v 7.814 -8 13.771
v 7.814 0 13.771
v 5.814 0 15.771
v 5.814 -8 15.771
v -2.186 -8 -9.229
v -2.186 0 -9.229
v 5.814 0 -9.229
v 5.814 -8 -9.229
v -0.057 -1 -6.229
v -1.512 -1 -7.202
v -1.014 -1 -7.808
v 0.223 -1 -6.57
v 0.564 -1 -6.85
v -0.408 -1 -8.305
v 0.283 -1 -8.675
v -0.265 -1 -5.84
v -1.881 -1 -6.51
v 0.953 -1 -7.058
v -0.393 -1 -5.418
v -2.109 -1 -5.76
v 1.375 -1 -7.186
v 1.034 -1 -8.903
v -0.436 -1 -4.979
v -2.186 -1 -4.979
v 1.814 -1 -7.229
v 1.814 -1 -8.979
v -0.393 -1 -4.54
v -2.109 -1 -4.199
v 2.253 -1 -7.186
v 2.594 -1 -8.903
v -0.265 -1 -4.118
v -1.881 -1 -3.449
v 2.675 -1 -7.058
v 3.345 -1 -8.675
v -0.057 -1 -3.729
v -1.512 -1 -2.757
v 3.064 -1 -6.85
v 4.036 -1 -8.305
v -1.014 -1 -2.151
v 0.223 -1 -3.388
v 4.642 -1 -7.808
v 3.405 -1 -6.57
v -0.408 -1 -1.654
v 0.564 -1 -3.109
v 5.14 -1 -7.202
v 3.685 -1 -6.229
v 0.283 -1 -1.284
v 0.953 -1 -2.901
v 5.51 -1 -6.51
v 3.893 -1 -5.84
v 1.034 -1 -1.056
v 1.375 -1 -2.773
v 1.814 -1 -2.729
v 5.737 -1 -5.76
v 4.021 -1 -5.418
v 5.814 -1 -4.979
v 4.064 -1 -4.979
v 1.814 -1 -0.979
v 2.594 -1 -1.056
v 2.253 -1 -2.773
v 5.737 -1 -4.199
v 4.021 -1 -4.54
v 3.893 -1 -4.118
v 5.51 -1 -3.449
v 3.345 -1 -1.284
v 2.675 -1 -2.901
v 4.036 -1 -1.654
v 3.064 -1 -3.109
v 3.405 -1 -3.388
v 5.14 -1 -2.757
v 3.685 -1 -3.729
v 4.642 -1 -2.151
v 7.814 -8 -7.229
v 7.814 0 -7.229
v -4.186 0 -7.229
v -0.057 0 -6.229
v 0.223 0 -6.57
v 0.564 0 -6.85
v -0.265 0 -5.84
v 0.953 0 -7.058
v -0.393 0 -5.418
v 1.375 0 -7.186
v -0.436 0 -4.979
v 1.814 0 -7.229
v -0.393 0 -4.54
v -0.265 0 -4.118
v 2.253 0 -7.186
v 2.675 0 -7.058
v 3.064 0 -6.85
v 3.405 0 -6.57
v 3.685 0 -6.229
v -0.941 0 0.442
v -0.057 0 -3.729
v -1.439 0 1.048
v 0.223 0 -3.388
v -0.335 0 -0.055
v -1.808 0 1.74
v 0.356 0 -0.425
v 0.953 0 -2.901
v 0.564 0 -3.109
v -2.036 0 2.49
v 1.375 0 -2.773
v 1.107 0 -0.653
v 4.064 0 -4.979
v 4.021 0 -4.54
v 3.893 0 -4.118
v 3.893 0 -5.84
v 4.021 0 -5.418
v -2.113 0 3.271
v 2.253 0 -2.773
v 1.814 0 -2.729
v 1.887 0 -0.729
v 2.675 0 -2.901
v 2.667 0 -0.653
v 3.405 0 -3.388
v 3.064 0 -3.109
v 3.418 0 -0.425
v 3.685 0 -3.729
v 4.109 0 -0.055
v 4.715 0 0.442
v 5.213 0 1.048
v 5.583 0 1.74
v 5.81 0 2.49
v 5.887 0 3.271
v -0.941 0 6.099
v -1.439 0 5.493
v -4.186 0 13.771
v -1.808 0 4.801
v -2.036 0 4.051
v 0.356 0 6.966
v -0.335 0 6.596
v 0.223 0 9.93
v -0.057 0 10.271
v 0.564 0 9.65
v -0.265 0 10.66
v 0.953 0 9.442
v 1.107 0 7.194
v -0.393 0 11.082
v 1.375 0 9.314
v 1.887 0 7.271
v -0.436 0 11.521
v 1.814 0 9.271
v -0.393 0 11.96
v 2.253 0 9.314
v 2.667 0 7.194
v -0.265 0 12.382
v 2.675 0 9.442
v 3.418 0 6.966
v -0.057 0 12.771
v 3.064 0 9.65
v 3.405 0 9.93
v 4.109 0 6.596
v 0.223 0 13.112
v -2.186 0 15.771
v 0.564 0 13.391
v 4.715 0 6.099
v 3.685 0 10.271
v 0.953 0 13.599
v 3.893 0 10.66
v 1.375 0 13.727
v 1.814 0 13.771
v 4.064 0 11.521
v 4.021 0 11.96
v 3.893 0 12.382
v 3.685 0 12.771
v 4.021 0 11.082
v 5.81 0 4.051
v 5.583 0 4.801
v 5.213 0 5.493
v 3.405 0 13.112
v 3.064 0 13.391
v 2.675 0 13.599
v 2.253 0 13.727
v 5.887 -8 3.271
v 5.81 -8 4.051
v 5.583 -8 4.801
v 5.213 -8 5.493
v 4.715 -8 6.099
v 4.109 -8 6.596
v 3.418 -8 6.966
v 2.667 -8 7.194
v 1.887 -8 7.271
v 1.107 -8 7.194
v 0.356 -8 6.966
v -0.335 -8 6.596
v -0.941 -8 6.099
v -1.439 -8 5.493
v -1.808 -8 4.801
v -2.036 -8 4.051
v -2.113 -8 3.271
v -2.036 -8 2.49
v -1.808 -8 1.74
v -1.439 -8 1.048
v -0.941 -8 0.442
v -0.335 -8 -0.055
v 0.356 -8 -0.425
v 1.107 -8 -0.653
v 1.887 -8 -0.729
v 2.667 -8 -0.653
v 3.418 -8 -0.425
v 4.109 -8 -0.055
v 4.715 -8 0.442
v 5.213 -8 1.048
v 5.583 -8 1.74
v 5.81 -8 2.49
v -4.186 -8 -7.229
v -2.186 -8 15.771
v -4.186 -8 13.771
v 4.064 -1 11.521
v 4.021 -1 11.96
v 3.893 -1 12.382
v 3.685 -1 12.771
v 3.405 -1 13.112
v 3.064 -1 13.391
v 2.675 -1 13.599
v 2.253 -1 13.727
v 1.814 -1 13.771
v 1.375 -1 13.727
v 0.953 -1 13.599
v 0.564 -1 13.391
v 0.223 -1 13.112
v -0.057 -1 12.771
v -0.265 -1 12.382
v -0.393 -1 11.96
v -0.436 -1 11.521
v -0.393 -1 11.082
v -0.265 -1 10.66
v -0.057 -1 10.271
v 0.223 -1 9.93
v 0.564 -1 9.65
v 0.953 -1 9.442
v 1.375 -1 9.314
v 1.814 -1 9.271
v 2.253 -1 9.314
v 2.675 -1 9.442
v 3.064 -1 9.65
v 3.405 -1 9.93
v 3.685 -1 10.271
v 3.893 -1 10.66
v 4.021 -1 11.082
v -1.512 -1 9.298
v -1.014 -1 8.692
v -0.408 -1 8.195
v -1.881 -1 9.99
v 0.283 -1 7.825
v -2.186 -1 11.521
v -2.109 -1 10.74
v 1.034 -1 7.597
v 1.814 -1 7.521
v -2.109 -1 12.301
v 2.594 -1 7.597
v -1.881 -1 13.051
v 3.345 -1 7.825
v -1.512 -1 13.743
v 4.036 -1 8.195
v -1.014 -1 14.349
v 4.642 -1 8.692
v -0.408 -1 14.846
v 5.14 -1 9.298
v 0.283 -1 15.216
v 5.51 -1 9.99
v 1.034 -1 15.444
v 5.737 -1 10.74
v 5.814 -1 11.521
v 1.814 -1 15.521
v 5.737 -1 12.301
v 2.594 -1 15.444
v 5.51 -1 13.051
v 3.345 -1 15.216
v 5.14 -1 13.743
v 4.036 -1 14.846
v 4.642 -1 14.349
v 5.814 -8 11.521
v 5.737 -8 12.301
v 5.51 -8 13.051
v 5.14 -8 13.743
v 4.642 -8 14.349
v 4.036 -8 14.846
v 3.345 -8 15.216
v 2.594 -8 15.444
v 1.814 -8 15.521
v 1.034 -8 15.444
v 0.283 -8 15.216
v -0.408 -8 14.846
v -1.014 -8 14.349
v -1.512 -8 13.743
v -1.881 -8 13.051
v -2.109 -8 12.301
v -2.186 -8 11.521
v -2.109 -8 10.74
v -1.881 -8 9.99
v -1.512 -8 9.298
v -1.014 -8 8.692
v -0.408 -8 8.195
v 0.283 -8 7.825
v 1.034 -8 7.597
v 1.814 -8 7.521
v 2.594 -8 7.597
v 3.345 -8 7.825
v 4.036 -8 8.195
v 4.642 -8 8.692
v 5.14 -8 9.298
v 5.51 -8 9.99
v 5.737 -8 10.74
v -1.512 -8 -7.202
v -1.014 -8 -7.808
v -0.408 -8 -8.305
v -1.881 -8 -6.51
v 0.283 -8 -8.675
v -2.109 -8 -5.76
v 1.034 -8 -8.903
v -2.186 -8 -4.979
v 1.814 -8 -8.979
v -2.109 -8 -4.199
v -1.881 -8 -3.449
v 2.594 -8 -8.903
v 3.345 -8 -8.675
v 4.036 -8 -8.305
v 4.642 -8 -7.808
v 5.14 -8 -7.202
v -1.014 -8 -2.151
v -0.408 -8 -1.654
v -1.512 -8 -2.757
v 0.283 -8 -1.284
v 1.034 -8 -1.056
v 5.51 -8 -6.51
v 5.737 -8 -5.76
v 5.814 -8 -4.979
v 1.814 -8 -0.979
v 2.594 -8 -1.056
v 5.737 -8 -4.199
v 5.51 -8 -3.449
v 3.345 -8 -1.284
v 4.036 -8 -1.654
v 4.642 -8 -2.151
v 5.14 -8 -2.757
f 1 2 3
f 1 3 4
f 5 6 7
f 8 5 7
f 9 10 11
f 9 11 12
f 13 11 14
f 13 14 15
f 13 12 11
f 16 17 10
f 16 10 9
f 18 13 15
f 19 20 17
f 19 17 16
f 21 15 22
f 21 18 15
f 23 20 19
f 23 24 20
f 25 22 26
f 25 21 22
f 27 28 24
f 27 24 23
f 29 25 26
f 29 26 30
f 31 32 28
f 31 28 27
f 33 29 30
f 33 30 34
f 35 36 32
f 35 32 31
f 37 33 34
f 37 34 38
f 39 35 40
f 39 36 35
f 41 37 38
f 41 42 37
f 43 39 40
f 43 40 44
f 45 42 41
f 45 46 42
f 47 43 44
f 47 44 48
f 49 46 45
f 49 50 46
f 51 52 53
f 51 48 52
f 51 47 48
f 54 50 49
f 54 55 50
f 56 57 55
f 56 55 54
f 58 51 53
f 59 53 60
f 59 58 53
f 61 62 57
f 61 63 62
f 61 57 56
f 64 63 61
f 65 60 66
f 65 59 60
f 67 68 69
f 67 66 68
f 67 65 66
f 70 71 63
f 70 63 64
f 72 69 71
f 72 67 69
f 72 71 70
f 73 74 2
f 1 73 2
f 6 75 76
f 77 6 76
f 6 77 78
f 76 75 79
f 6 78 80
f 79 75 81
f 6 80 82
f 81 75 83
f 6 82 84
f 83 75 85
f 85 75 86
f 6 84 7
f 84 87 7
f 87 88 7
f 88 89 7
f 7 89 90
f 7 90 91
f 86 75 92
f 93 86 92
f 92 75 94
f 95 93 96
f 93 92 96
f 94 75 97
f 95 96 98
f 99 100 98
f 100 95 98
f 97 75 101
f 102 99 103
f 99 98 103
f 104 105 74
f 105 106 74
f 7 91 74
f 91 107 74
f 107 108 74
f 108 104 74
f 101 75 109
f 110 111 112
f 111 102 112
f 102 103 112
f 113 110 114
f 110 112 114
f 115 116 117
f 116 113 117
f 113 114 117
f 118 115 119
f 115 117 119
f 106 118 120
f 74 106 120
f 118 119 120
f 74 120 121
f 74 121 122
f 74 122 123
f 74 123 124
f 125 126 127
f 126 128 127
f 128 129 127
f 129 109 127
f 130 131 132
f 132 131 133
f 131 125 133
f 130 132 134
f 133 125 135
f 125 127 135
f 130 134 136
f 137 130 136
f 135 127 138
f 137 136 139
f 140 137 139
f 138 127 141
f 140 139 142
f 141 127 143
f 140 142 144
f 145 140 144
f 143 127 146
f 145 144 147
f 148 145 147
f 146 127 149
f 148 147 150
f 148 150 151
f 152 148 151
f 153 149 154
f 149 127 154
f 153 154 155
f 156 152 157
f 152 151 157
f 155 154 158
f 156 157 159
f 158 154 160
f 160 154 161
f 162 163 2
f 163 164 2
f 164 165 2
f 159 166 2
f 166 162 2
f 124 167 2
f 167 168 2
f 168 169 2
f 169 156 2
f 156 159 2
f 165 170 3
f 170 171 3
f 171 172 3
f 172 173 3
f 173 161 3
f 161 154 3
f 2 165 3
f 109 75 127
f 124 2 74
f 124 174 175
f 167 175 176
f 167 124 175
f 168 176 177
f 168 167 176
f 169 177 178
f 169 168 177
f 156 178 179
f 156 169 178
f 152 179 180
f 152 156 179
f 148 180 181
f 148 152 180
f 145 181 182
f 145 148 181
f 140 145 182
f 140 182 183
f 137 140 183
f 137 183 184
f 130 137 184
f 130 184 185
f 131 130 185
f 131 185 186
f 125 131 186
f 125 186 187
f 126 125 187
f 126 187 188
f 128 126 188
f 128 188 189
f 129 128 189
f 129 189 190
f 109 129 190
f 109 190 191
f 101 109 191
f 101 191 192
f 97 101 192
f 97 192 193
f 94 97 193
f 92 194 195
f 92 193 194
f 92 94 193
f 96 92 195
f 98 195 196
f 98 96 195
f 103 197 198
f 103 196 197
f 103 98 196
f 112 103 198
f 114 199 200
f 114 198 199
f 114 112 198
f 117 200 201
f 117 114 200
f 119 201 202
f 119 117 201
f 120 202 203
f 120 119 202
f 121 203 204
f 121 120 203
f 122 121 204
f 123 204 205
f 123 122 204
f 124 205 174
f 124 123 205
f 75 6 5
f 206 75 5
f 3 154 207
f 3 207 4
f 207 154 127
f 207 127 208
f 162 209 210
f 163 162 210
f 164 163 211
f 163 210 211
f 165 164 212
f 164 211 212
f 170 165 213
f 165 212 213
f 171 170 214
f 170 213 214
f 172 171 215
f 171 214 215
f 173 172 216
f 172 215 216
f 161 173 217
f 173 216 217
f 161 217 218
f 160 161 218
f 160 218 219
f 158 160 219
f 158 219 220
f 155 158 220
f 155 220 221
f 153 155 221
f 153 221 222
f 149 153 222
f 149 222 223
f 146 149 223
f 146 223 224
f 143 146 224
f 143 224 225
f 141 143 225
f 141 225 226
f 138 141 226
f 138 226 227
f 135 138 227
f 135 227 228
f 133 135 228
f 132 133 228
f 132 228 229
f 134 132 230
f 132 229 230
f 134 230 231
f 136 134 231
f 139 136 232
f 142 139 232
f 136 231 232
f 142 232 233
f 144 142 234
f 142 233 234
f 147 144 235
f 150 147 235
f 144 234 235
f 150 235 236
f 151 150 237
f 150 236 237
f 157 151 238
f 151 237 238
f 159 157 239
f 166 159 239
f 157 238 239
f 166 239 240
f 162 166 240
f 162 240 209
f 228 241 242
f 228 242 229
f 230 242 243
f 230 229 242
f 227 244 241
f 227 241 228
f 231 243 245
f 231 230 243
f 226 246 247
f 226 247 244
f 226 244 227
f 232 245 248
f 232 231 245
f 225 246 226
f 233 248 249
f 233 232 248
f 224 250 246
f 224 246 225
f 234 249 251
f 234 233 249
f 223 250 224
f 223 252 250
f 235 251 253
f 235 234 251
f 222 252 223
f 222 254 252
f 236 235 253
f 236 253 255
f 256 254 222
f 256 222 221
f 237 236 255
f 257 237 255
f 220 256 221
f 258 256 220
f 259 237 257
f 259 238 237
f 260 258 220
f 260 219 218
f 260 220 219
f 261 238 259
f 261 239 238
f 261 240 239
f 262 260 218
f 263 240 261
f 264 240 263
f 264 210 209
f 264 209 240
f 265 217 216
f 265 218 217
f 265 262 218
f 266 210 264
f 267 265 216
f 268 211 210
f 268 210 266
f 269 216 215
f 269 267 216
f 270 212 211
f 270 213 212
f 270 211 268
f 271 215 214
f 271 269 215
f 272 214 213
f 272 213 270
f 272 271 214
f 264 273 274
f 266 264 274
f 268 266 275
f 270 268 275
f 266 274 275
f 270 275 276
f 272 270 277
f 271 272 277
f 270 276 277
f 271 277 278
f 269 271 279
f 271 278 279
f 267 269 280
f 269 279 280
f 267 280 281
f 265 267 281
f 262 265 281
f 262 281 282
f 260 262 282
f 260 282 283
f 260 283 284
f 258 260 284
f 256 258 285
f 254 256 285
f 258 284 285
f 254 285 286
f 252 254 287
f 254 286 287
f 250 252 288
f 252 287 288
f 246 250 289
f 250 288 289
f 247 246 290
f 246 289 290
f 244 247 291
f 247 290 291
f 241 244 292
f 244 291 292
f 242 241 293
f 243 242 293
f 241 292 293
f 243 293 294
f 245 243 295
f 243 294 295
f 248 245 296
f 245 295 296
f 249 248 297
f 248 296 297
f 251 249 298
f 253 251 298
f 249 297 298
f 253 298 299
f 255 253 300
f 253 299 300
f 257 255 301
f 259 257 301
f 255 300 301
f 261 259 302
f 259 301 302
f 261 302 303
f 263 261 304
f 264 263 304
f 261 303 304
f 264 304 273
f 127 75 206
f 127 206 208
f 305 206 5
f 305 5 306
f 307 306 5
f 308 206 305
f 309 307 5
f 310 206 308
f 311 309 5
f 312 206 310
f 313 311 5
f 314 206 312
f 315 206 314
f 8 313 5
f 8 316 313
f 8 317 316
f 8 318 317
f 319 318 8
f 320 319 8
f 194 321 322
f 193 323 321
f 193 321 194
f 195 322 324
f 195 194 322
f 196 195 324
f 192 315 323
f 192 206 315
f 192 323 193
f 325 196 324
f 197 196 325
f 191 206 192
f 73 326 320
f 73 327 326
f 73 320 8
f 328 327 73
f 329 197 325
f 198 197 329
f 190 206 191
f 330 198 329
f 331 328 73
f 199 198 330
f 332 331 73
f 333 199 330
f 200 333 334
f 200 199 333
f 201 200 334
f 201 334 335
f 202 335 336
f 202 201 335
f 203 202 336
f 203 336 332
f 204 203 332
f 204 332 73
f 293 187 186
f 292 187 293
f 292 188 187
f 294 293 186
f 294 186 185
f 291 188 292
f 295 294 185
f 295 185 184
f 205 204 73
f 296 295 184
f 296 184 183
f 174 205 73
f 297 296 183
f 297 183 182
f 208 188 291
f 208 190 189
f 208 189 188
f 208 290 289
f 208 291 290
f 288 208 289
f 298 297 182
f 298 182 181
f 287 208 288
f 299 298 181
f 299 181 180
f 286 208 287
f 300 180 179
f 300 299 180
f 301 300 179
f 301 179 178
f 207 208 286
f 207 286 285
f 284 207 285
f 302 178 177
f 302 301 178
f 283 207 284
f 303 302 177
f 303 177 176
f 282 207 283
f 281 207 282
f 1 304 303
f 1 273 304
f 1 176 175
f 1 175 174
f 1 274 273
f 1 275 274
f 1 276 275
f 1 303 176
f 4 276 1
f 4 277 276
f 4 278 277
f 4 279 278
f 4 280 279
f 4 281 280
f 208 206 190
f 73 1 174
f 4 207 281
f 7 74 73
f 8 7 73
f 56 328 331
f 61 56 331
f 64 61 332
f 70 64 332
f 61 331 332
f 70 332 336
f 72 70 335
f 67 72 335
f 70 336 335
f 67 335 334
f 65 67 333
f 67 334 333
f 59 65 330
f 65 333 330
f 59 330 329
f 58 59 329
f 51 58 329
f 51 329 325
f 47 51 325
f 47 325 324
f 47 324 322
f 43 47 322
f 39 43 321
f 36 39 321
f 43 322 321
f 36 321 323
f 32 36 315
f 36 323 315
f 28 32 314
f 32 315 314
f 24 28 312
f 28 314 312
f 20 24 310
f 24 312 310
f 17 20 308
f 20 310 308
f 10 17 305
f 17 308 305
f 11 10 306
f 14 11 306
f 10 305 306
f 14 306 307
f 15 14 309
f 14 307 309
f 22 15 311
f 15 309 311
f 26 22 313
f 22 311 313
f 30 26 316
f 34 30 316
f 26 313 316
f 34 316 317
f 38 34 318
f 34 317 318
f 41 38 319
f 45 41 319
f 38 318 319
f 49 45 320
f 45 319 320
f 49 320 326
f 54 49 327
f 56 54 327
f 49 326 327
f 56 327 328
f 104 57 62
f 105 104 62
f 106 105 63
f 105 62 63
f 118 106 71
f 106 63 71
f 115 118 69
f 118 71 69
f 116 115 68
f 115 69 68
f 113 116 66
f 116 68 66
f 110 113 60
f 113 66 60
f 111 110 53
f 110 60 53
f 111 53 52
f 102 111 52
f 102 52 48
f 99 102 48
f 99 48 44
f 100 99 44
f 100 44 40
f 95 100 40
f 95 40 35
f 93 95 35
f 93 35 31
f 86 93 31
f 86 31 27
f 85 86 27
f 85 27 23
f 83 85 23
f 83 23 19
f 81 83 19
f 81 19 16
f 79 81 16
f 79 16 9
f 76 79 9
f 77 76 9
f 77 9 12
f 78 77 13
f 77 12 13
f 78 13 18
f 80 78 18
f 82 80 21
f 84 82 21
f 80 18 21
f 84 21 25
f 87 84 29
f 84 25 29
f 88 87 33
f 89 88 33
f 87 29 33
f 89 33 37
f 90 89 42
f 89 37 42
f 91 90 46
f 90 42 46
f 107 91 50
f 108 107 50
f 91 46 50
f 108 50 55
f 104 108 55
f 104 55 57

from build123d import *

# Parameters (mm, degrees)
F0_W     = 12
F0_H     = 25
F1_DEPTH = 8
F2_SIZE  = 2
F3_SIZE  = 2
F4_R     = 2.25
F5_DEPTH = 25
F6_R     = 4
F7_DEPTH = 7
F8_R     = 4
F9_DEPTH = 25


with BuildPart() as f1:
    # F0 (on Front) → F1 (new body)
    with BuildSketch(Plane.XZ):
        with Locations((1.81407, 3.270565)):
            Rectangle(F0_W, F0_H)
    extrude(amount=F1_DEPTH)

    # F2
    f2_edges = [f1.edges().sort_by_distance(p)[0] for p in [
        (-4.18593, -4, 15.770565),
    ]]
    chamfer(f2_edges, length=F2_SIZE)

    # F3
    f3_edges = [f1.edges().sort_by_distance(p)[0] for p in [
        (7.81407, -4, 15.770565),
        (7.81407, -4, -9.229435),
        (-4.18593, -4, -9.229435),
    ]]
    chamfer(f3_edges, length=F3_SIZE)

    # F4 (on face) → F5 (cut)
    with BuildSketch(Plane.XZ.offset(8)):
        with Locations((1.81407, -4.979435)):
            Circle(F4_R)
        with Locations((1.81407, 11.520565)):
            Circle(F4_R)
    extrude(amount=-F5_DEPTH, mode=Mode.SUBTRACT)

    # F6 (on face) → F7 (cut)
    with BuildSketch(Plane.XZ.offset(8)):
        with Locations((1.81407, 11.520565)):
            Circle(F6_R)
        with Locations((1.81407, -4.979435)):
            Circle(F6_R)
    extrude(amount=-F7_DEPTH, mode=Mode.SUBTRACT)

    # F8 (on Front) → F9 (cut)
    with BuildSketch(Plane.XZ):
        with Locations((1.887019, 3.270565)):
            Circle(F8_R)
    extrude(amount=F9_DEPTH, mode=Mode.SUBTRACT)


solid = f1.part
